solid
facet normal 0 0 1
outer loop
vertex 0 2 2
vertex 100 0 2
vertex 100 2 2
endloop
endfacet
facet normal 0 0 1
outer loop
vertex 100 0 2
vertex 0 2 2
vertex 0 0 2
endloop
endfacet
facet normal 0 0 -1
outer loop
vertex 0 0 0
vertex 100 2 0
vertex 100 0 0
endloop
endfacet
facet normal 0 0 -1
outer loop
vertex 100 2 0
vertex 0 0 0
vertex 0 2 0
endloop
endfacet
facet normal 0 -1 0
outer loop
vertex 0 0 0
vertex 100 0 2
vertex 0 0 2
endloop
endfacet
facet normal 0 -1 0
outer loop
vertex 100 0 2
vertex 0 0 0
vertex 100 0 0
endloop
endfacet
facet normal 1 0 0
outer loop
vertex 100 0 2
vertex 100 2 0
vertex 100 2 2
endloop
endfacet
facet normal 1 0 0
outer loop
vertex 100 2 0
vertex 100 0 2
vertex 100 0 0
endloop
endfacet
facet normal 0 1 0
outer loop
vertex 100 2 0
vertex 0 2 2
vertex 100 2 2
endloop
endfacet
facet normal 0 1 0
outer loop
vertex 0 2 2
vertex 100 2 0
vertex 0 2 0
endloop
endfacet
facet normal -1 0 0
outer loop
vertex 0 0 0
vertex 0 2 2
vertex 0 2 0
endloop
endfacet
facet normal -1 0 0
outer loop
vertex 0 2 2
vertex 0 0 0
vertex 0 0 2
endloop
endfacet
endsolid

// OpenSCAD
$fn=250;

cube([100,2,2]);
/*
intersection(){
    outline();
    c = 500;
    translate([0,-c/2,0])cube([c,c,c], center=true);
}
module outline(){
    translate([0,50,0])
        difference(){
            out();
            in();
        }
}

module in(){
    d=112;
    translate([0,0,0])cylinder(h=2.1,d=d, center=true);
    w = 248-d/2;
    translate([0,-w/2,0])cube([d,w,2.1], center=true);
}

module out(){
    o = 4;
    d=112+o;
    translate([0,0,0])cylinder(h=2,d=d, center=true);
    w = 248-d/2+o;
    translate([0,-w/2,0])cube([d,w,2], center=true);
}*/
